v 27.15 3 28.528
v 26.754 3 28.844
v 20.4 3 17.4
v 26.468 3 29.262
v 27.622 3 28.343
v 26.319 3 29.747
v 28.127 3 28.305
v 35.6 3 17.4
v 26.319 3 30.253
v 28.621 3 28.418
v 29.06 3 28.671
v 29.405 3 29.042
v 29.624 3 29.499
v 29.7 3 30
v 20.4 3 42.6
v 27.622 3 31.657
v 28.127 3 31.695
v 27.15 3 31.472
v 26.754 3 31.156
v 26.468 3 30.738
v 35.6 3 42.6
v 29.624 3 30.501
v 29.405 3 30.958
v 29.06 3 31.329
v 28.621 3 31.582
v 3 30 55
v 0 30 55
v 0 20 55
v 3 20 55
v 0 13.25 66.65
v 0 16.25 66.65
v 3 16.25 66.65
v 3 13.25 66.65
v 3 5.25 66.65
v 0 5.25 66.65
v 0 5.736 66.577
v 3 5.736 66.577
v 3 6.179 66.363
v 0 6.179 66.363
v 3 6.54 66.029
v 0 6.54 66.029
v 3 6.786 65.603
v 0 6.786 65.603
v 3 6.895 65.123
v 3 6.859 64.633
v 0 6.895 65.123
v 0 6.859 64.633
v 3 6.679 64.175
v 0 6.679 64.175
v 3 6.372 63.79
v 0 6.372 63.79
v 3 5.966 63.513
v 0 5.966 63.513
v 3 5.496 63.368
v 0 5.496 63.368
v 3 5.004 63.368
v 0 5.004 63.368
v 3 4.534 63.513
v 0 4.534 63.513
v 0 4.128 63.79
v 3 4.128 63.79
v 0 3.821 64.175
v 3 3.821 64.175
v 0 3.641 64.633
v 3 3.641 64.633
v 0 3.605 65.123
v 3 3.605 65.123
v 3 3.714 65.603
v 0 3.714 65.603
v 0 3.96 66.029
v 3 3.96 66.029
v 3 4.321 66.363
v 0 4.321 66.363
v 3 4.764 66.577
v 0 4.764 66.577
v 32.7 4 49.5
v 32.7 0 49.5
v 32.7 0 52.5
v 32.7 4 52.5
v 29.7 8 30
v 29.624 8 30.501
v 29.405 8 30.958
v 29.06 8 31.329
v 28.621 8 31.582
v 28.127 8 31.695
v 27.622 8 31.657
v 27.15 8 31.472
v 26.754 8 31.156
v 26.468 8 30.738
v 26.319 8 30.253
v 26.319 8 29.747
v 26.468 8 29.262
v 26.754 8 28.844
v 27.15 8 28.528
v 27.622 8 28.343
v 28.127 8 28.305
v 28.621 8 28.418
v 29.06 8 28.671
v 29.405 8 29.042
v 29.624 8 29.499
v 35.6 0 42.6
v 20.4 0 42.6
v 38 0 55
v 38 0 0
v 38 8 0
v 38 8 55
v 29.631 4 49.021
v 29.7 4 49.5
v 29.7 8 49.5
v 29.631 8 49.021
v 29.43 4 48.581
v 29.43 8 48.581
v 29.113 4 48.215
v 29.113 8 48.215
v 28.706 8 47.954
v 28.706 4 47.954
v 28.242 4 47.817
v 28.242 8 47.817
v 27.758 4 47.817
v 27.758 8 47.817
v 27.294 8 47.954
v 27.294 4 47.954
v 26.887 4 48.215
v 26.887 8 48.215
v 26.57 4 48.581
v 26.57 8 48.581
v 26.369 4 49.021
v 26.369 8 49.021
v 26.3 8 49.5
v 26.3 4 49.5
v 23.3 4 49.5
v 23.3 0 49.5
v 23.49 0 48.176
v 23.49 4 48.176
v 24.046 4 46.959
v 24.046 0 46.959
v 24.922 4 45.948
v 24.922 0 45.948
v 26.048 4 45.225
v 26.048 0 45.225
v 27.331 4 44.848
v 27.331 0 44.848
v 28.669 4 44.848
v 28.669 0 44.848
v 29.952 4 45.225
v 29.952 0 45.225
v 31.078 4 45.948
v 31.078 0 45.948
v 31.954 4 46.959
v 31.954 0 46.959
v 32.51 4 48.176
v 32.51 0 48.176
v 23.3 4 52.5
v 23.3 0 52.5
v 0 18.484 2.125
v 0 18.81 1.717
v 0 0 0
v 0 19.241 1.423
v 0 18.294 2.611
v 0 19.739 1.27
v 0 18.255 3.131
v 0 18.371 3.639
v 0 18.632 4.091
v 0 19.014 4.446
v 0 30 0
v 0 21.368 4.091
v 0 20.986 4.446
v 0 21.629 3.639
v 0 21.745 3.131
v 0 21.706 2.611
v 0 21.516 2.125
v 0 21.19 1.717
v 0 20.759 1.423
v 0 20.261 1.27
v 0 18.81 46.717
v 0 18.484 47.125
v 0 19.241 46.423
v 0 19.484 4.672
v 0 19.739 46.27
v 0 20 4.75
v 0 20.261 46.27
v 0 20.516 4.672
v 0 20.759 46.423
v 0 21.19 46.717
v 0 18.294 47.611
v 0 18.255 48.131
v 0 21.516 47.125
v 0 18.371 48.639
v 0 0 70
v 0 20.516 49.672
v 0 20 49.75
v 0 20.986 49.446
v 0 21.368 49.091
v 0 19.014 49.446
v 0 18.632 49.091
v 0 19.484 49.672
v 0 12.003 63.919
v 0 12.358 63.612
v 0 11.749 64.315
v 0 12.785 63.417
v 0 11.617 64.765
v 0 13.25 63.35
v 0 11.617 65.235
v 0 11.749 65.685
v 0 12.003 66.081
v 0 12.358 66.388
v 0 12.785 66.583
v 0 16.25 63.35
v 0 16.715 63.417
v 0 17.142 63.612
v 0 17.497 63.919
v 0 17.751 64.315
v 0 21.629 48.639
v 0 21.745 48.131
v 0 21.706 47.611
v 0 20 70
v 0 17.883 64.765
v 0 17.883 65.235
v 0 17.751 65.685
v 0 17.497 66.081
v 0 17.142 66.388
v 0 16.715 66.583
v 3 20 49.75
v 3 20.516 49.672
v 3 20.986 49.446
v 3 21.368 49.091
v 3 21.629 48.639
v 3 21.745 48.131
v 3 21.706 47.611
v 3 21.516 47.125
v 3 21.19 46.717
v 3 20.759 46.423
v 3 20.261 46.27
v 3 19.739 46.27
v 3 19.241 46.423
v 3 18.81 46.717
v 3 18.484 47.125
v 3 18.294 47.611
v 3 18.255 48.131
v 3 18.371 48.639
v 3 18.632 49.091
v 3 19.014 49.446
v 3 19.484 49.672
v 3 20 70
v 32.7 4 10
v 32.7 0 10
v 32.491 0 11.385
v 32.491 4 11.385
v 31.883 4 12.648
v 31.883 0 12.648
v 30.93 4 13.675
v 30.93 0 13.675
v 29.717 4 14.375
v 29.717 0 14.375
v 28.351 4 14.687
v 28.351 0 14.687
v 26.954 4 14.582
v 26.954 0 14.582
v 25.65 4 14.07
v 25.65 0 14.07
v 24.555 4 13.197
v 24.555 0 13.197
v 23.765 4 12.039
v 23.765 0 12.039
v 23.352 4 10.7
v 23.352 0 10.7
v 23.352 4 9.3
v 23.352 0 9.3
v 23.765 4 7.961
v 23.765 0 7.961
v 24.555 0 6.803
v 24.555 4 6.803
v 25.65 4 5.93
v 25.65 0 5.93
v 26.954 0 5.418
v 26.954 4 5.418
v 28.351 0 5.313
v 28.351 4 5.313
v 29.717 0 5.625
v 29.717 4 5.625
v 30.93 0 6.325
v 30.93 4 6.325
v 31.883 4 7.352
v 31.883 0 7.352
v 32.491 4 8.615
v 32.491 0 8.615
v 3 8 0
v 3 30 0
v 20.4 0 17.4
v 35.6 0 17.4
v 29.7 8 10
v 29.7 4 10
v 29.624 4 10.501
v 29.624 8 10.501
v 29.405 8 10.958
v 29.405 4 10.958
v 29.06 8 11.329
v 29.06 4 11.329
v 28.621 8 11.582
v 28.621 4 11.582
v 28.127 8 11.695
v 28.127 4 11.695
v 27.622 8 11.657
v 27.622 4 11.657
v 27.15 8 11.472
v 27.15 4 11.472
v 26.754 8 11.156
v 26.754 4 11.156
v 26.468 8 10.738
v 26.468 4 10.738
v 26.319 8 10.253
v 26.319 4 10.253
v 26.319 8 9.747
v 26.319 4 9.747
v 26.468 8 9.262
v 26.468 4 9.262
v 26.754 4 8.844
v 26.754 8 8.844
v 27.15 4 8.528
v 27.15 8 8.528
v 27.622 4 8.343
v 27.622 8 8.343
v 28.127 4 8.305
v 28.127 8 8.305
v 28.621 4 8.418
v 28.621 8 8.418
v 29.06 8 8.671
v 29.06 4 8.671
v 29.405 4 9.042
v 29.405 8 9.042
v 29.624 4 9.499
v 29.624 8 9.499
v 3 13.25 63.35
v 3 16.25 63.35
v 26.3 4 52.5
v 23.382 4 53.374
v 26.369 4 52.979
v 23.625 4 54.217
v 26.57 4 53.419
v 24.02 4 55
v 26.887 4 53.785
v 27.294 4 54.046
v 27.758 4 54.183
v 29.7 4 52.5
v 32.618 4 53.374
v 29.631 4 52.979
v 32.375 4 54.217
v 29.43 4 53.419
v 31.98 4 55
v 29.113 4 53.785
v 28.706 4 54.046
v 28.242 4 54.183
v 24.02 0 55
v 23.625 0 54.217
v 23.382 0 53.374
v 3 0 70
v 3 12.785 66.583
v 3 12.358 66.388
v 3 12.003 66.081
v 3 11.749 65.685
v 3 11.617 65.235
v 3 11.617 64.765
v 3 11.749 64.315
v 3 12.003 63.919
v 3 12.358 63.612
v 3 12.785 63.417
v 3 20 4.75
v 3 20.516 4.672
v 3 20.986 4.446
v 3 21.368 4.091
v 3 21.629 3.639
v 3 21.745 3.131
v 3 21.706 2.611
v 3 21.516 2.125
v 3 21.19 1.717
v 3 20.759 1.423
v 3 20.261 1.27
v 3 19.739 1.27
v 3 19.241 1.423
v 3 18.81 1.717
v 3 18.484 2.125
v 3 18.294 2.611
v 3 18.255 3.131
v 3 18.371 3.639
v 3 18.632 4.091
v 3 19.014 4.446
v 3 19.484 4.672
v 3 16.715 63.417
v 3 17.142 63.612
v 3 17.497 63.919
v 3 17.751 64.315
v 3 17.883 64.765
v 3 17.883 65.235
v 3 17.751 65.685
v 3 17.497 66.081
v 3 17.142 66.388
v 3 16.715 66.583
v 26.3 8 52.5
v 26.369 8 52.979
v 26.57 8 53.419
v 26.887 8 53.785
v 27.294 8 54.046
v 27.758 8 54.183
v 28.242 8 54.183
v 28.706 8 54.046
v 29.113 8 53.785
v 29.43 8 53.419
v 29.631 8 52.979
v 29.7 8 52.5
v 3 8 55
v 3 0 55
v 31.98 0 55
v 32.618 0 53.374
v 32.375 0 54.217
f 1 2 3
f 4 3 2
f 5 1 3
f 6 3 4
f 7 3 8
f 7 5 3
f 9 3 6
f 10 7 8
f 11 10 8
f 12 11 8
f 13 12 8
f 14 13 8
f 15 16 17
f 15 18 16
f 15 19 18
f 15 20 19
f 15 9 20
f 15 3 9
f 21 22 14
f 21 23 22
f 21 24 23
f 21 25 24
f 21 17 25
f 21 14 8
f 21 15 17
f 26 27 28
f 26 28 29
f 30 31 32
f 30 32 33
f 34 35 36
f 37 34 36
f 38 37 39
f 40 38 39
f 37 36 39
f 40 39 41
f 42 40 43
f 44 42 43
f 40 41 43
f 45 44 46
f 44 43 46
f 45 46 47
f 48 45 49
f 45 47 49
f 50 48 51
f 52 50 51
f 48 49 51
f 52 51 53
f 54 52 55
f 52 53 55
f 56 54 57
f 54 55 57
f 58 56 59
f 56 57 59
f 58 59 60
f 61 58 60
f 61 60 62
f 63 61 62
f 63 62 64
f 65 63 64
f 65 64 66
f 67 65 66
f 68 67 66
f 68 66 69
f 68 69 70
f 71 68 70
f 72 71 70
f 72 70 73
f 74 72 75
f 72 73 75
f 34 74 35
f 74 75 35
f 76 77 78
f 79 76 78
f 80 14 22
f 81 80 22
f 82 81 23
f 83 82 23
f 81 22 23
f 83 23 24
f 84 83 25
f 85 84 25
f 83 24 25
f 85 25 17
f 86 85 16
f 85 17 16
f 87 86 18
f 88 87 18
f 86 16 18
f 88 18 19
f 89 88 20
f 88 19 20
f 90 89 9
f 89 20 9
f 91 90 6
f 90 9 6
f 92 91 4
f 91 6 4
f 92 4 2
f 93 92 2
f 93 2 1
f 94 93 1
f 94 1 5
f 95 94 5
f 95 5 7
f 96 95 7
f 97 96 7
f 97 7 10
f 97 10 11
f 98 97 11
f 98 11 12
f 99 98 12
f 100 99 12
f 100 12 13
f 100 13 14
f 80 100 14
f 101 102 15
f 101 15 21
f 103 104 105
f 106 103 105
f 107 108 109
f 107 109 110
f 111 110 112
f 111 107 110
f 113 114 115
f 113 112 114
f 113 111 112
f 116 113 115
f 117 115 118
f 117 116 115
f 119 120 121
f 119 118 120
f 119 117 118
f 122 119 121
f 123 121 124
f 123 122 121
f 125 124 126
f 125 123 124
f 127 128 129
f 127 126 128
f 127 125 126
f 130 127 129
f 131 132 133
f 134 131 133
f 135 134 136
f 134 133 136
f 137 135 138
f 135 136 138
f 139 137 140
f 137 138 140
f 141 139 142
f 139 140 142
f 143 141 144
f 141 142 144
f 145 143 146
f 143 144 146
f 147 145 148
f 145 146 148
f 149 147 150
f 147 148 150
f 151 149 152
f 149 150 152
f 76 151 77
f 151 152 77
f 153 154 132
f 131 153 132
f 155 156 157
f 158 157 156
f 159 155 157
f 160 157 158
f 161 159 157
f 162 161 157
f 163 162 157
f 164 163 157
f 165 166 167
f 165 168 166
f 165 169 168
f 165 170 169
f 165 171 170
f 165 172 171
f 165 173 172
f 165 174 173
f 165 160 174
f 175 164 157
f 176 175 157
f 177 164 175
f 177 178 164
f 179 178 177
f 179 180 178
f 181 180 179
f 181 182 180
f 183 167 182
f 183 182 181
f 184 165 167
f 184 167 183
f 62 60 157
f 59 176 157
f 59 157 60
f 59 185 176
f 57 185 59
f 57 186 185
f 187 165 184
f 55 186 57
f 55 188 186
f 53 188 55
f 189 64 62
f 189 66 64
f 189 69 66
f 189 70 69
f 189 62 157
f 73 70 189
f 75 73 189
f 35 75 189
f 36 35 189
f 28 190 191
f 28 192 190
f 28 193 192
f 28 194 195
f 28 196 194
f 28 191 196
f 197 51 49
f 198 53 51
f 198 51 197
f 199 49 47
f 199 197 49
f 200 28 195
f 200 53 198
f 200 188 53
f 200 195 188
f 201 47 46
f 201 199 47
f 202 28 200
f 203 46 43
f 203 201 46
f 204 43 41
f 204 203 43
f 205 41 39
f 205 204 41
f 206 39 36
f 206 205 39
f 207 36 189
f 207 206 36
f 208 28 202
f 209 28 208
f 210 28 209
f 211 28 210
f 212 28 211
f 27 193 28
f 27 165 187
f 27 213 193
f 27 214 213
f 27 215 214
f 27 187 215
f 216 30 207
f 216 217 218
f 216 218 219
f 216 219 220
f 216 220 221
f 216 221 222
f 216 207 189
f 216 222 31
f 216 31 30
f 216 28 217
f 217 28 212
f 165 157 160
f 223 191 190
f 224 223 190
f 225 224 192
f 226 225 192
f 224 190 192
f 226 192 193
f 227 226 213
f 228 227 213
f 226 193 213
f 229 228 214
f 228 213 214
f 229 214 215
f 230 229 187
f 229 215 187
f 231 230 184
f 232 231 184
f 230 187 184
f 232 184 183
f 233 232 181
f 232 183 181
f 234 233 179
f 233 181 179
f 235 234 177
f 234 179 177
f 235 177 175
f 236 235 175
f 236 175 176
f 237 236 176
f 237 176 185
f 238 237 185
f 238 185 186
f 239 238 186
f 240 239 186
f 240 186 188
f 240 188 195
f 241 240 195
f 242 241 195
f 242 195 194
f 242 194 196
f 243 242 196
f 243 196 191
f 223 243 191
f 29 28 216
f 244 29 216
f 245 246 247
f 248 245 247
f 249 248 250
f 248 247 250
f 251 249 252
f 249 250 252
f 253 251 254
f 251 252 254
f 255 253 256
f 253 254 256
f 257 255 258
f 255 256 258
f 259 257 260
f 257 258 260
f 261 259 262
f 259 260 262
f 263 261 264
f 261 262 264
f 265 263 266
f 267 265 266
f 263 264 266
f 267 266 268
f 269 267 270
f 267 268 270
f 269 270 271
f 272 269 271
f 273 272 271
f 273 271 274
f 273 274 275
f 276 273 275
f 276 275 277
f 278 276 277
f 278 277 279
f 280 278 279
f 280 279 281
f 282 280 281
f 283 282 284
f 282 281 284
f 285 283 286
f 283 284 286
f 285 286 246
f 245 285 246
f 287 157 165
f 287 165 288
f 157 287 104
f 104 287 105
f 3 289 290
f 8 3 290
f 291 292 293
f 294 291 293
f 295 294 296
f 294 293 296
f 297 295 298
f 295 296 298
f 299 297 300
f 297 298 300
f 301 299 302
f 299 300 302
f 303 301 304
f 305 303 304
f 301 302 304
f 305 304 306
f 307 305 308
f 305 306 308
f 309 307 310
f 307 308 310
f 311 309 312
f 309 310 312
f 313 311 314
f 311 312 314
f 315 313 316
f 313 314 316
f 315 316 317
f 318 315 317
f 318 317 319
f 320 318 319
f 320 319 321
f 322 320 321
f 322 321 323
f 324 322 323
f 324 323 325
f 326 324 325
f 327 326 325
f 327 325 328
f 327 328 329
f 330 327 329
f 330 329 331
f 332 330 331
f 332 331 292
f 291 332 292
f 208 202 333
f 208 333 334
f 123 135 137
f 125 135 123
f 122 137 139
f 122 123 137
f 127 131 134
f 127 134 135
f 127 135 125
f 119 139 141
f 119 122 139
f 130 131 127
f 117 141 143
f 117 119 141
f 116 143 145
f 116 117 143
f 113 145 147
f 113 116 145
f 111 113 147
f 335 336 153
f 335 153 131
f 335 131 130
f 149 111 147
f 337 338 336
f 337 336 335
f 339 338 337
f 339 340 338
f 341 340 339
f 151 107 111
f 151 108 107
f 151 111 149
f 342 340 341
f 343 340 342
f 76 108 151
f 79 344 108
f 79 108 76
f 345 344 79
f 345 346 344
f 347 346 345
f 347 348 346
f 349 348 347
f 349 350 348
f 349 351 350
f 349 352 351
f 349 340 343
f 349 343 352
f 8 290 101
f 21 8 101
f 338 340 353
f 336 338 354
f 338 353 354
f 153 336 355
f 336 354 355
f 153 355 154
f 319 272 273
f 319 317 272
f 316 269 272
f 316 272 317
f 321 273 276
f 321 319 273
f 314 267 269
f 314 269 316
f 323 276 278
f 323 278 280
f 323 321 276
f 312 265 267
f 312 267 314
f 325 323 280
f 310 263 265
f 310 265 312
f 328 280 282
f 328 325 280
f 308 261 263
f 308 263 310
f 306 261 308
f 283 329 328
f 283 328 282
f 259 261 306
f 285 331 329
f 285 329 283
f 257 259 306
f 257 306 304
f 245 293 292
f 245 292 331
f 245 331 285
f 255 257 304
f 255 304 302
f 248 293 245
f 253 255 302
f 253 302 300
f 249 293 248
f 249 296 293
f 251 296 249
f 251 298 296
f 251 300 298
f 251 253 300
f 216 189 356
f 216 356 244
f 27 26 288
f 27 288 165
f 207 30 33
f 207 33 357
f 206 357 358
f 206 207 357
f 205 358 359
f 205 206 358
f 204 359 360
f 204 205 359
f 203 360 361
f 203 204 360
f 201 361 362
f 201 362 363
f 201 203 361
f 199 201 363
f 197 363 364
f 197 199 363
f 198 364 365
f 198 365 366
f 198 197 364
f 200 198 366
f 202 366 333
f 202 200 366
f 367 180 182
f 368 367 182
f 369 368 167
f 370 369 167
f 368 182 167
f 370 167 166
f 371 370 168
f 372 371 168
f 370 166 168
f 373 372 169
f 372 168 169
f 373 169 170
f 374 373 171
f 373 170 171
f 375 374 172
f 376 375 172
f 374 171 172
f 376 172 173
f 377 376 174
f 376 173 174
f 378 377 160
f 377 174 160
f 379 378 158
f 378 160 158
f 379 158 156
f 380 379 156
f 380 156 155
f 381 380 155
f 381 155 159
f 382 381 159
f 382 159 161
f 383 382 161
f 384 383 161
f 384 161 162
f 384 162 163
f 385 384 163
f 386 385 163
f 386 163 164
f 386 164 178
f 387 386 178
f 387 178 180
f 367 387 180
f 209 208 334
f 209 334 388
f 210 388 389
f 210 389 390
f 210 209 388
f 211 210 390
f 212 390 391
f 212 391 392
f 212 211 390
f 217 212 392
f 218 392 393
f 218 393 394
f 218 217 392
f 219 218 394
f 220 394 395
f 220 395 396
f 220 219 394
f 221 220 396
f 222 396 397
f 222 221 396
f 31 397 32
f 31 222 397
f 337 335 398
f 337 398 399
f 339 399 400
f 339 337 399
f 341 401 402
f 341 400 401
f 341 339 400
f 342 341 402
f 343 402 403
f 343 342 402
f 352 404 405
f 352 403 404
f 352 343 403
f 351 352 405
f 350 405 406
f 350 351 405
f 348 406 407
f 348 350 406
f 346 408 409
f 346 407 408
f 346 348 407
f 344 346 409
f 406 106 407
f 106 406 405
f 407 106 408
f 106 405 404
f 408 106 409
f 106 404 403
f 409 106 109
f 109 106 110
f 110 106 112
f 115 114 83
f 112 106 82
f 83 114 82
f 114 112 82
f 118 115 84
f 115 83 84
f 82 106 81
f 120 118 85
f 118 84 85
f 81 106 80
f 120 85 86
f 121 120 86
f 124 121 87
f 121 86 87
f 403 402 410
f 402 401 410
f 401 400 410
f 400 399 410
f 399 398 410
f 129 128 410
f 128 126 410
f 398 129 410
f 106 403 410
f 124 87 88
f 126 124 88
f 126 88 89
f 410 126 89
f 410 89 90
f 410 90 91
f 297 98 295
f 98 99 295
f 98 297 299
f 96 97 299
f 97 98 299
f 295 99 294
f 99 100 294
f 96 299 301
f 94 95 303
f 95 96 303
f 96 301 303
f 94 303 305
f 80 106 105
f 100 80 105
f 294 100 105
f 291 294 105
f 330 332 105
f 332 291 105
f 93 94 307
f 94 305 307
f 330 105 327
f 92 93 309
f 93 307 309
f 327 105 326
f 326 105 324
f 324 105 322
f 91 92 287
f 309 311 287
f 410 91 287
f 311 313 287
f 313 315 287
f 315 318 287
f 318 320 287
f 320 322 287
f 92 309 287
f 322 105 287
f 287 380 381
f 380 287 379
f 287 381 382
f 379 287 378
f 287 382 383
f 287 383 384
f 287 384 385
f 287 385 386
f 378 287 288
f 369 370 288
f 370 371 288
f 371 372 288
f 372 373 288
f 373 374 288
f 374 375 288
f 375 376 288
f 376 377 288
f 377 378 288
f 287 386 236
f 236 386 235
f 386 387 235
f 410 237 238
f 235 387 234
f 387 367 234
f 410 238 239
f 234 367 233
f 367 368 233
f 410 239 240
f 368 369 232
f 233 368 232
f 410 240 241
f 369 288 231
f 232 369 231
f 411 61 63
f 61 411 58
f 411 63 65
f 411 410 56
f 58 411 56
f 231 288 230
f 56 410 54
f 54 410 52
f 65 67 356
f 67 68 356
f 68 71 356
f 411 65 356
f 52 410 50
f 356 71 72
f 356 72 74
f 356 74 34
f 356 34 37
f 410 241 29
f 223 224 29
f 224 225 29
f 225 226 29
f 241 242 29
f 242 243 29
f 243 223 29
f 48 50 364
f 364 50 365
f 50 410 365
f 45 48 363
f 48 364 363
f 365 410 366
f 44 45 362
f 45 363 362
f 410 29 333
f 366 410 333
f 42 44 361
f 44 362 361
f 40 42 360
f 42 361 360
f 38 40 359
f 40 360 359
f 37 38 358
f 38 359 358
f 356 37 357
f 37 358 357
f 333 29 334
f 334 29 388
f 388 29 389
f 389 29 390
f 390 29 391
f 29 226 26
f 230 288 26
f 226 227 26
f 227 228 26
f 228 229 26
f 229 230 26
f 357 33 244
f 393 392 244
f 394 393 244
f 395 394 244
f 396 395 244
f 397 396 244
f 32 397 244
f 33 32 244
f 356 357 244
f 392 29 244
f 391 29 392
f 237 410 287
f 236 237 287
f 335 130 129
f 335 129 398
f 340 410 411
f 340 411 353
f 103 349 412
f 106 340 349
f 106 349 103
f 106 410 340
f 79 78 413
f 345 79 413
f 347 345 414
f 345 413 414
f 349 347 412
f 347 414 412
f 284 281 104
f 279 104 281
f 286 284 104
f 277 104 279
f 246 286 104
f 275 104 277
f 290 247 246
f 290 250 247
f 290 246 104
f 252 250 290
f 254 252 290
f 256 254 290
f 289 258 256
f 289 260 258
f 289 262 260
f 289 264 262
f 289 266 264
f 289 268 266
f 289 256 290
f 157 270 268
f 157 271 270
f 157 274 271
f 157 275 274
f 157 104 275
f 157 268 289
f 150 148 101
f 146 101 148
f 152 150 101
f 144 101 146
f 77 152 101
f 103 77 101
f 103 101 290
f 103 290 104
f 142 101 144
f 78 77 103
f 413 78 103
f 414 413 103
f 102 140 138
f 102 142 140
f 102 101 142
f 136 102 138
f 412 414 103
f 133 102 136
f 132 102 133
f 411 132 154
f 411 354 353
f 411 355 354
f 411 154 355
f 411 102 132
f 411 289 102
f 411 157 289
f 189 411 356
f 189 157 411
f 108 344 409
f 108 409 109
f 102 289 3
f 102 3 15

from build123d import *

# Parameters (mm, degrees)
RESSALTO_EXTRUS_O1_DEPTH = 55
ESBO_O2_W                = 15.2
ESBO_O2_H                = 25.2
CORTE_EXTRUS_O1_DEPTH    = 3
ESBO_O4_R                = 1.7
CORTE_EXTRUS_O2_DEPTH    = 31
ESBO_O5_R                = 4.7
CORTE_EXTRUS_O3_DEPTH    = 4
ESBO_O6_R                = 1.75
CORTE_EXTRUS_O4_DEPTH    = 4
ESBO_O7_W                = 15
ESBO_O7_H                = 20
ESBO_O7_R                = 1.65
RESSALTO_EXTRUS_O2_DEPTH = 3


with BuildPart() as part:
    # Esboço1 → Ressalto-extrusão1 (new body)
    with BuildSketch(Plane.XY):
        Polygon((0, 0), (38, 0), (38, 8), (3, 8), (3, 30), (0, 30), align=None)
    extrude(amount=RESSALTO_EXTRUS_O1_DEPTH)

    # Esboço2 → Corte-extrusão1 (cut)
    with BuildSketch(Plane.XZ):
        with Locations((28, 30)):
            Rectangle(ESBO_O2_W, ESBO_O2_H)
    extrude(amount=-CORTE_EXTRUS_O1_DEPTH, mode=Mode.SUBTRACT)

    # Esboço4 → Corte-extrusão2 (cut, through all)
    with BuildSketch(Plane.XZ):
        with Locations((28, 30)):
            Circle(ESBO_O4_R)
        with Locations((28, 10)):
            Circle(ESBO_O4_R)
        with BuildLine():
            Line((29.7, 52.5), (29.7, 49.5))
            ThreePointArc((29.7, 49.5), (28, 47.8), (26.3, 49.5))
            Line((26.3, 49.5), (26.3, 52.5))
            ThreePointArc((26.3, 52.5), (28, 54.2), (29.7, 52.5))
        make_face()
    extrude(amount=-CORTE_EXTRUS_O2_DEPTH, mode=Mode.SUBTRACT)

    # Esboço5 → Corte-extrusão3 (cut)
    with BuildSketch(Plane.XZ):
        with Locations((28, 10)):
            Circle(ESBO_O5_R)
        with BuildLine():
            Line((32.7, 49.5), (32.7, 52.5))
            ThreePointArc((32.7, 52.5), (28, 57.2), (23.3, 52.5))
            Line((23.3, 52.5), (23.3, 49.5))
            ThreePointArc((23.3, 49.5), (28, 44.8), (32.7, 49.5))
        make_face()
    extrude(amount=-CORTE_EXTRUS_O3_DEPTH, mode=Mode.SUBTRACT)

    # Esboço6 → Corte-extrusão4 (cut)
    with BuildSketch(Plane.ZY):
        with Locations((48, 20)):
            Circle(ESBO_O6_R)
        with Locations((3, 20)):
            Circle(ESBO_O6_R)
    extrude(amount=-CORTE_EXTRUS_O4_DEPTH, mode=Mode.SUBTRACT)

    # Esboço7 → Ressalto-extrusão2 (add)
    with BuildSketch(Plane.ZY):
        with Locations((62.5, 10)):
            Rectangle(ESBO_O7_W, ESBO_O7_H)
        with Locations((65, 5.25)):
            Circle(ESBO_O7_R, mode=Mode.SUBTRACT)
        with BuildLine():
            Line((63.35, 13.25), (63.35, 16.25))
            ThreePointArc((63.35, 16.25), (65, 17.9), (66.65, 16.25))
            Line((66.65, 16.25), (66.65, 13.25))
            ThreePointArc((66.65, 13.25), (65, 11.6), (63.35, 13.25))
        make_face(mode=Mode.SUBTRACT)
    extrude(amount=-RESSALTO_EXTRUS_O2_DEPTH)


solid = part.part
